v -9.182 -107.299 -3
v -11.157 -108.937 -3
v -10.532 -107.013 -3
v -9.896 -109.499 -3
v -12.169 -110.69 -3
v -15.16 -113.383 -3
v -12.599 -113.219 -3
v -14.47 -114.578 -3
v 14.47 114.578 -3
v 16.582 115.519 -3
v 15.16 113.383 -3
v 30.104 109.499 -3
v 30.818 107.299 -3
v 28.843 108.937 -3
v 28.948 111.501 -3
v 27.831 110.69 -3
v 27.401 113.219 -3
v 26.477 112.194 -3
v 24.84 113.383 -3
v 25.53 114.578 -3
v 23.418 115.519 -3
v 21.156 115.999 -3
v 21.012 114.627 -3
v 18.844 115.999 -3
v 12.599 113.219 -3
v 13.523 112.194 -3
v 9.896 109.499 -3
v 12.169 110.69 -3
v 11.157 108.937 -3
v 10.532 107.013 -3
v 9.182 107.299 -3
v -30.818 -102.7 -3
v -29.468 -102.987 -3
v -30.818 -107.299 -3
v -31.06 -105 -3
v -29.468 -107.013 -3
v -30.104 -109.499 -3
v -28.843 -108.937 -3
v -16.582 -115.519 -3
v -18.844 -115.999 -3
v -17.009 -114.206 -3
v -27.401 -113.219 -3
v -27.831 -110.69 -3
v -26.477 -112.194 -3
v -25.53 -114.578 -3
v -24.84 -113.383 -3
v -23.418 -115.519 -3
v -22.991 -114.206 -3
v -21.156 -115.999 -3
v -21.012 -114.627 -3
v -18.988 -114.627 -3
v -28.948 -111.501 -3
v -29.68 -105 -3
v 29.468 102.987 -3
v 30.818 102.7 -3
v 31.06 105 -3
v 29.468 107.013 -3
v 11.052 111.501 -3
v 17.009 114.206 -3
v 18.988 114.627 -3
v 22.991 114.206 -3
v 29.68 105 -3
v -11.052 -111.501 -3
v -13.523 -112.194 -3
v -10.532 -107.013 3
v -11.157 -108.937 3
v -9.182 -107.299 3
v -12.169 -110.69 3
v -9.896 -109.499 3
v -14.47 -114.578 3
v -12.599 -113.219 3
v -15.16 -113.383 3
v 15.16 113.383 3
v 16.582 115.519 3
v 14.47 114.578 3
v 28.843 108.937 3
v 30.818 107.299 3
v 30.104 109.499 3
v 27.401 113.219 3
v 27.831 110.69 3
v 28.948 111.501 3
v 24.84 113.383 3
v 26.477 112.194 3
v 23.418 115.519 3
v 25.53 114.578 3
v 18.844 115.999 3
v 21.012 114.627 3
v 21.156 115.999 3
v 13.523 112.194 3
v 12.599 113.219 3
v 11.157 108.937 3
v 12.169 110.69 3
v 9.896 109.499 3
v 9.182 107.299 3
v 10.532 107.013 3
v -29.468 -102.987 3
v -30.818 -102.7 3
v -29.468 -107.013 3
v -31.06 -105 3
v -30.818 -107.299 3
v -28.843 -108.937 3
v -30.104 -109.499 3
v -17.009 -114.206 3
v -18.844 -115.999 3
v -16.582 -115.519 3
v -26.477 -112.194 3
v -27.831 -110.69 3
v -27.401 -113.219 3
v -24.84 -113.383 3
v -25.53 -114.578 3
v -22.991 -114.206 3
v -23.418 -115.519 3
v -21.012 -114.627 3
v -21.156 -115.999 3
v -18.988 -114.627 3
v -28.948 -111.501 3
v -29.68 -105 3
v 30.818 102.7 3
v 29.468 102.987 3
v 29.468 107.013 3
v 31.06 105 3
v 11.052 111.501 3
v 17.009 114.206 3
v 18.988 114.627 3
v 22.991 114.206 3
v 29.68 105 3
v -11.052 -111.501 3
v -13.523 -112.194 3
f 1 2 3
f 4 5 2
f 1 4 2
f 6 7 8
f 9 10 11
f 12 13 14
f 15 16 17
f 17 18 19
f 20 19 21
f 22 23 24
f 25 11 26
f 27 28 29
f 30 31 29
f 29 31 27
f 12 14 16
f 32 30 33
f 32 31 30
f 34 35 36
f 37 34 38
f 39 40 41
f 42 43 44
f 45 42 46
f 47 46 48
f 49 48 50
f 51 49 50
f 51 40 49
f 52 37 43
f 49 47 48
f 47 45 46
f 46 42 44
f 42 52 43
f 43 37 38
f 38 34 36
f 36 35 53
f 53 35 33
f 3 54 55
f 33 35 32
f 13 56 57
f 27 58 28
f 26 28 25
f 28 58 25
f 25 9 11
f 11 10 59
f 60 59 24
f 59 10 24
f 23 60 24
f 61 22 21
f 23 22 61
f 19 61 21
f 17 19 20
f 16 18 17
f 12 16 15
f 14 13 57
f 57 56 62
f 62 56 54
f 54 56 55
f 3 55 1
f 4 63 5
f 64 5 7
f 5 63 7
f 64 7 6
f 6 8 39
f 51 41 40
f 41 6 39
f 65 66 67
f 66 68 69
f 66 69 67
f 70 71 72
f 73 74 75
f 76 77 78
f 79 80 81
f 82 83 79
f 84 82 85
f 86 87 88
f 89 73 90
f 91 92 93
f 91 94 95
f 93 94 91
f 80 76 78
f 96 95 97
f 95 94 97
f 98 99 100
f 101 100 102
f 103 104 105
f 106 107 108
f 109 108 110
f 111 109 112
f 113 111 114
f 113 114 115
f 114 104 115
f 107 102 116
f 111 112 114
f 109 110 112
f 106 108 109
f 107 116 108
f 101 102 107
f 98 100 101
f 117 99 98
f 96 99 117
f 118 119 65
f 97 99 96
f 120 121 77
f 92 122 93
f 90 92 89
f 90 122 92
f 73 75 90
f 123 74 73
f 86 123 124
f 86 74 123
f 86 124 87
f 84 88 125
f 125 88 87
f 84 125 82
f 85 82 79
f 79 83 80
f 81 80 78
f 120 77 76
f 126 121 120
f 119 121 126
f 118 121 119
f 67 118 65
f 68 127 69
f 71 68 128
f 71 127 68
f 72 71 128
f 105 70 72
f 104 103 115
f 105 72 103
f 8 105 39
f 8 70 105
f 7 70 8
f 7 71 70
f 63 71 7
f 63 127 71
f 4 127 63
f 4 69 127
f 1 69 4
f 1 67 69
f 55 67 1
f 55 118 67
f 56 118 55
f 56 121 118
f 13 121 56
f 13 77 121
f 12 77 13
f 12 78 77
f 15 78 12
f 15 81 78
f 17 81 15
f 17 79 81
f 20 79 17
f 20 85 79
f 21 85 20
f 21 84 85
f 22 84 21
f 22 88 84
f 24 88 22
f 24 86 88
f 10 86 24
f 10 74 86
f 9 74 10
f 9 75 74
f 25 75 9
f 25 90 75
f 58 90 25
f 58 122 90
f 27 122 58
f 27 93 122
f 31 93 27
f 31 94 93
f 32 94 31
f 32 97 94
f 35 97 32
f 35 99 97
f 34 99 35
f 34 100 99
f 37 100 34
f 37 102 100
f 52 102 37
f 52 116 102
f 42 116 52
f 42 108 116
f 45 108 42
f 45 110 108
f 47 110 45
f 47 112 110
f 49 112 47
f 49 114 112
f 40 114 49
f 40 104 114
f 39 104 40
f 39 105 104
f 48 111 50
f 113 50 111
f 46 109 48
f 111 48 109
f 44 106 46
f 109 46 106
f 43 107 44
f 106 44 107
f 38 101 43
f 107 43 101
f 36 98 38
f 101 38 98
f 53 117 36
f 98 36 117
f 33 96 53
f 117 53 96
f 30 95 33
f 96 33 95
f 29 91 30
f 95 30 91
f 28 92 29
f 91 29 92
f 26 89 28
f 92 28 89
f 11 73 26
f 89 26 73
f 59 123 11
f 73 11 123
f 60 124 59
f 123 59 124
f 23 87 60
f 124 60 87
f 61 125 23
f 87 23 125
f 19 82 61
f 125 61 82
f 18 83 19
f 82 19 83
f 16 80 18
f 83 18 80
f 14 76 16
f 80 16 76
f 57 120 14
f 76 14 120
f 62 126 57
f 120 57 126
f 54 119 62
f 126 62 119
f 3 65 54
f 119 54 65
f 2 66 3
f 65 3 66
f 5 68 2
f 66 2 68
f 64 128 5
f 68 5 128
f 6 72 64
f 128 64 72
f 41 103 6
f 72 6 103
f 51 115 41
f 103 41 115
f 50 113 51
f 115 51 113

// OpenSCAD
//
// Mendel90
//
// GNU GPL v2
// nop.head@gmail.com
// hydraraptor.blogspot.com
//
// Belt model
//
T5x6 =  [  5,  6, 2.25];
T5x10 = [  5, 10, 2.25];
T2p5x6 =[2.5,  6,  1.7];
GT2 =   [2.0,  6,  1.38];

function belt_pitch(type) = type[0];
function belt_width(type) = type[1];
function belt_thickness(type) = type[2];

module belt(type, x1, y1, r1, x2, y2, r2, gap = 0) {
    width = belt_width(type);
    pitch = belt_pitch(type);
    thickness = belt_thickness(type);

    pi = 3.14159265;
    dx = x2 - x1;
    dy = y2 - y1;

    length = round((pi * (r1 + r2 + thickness) + 2 * sqrt(dx * dx + dy * dy) - gap) / pitch) * pitch;
    //vitamin(str("BT", belt_pitch(type) * 10,width, round(length), ": Belt T", belt_pitch(type)," x ", width, "mm x ", round(length), "mm"));

    color("white")
    linear_extrude(height = width, center = true, convexity = 6) {
        difference() {
            hull() {                                                    // outside of belt
                translate([x1,y1])
                    circle(r = r1 + thickness, center = true);
                translate([x2,y2])
                    circle(r = r2 + thickness, center = true);
            }
            hull() {                                                    // inside of belt
                translate([x1,y1])
                    circle(r = r1, center = true);
                translate([x2,y2])
                    circle(r = r2, center = true);
            }
        }
    }
}

module twisted_belt(type, x1, y1, r1, x2, y2, r2, gap = 0) {
    dx = x2 - x1;
    dy = y2 - y1;

    angle = atan2(dy, dx) - atan2((r2 - r1), dx);

    color("white")
    union() {
        difference() {
            belt(type, x1, y1, r1, x2, y2, r2, gap);
            translate([x1, y1 - r1 - belt_thickness(type) / 2, 0])
                rotate([0,0, angle])
                    translate([dx / 2, 0, 0])
                        cube([dx, belt_thickness(type) + 1 , belt_width(type) + 1], center = true);
        }
        translate([x1, y1 - r1 - belt_thickness(type) / 2, 0])
            rotate([0,90, angle])
                linear_extrude(height = dx, twist = 180)
                    square([belt_width(type), belt_thickness(type)], center = true);
    }
}

//twisted_belt(T5x6, 10, 11-4.87, 4.87, 200, 20, 11);
//twisted_belt(T5x6,  -374, -1.55, 6.5, 0, 0, 4.95);

belt(GT2, 20, 105, 9.68, -20, -105, 9.68, gap=200);
//gimme_belt("GT2", 20, 105, 9.68, -20, -105, 9.68, gap=50);


module gimme_belt(type, x1, y1, r1, x2, y2, r2, gap)
{
	if(type=="GT2")
		belt(GT2, x1, y1, r1, x2, y2, r2, gap);
}
